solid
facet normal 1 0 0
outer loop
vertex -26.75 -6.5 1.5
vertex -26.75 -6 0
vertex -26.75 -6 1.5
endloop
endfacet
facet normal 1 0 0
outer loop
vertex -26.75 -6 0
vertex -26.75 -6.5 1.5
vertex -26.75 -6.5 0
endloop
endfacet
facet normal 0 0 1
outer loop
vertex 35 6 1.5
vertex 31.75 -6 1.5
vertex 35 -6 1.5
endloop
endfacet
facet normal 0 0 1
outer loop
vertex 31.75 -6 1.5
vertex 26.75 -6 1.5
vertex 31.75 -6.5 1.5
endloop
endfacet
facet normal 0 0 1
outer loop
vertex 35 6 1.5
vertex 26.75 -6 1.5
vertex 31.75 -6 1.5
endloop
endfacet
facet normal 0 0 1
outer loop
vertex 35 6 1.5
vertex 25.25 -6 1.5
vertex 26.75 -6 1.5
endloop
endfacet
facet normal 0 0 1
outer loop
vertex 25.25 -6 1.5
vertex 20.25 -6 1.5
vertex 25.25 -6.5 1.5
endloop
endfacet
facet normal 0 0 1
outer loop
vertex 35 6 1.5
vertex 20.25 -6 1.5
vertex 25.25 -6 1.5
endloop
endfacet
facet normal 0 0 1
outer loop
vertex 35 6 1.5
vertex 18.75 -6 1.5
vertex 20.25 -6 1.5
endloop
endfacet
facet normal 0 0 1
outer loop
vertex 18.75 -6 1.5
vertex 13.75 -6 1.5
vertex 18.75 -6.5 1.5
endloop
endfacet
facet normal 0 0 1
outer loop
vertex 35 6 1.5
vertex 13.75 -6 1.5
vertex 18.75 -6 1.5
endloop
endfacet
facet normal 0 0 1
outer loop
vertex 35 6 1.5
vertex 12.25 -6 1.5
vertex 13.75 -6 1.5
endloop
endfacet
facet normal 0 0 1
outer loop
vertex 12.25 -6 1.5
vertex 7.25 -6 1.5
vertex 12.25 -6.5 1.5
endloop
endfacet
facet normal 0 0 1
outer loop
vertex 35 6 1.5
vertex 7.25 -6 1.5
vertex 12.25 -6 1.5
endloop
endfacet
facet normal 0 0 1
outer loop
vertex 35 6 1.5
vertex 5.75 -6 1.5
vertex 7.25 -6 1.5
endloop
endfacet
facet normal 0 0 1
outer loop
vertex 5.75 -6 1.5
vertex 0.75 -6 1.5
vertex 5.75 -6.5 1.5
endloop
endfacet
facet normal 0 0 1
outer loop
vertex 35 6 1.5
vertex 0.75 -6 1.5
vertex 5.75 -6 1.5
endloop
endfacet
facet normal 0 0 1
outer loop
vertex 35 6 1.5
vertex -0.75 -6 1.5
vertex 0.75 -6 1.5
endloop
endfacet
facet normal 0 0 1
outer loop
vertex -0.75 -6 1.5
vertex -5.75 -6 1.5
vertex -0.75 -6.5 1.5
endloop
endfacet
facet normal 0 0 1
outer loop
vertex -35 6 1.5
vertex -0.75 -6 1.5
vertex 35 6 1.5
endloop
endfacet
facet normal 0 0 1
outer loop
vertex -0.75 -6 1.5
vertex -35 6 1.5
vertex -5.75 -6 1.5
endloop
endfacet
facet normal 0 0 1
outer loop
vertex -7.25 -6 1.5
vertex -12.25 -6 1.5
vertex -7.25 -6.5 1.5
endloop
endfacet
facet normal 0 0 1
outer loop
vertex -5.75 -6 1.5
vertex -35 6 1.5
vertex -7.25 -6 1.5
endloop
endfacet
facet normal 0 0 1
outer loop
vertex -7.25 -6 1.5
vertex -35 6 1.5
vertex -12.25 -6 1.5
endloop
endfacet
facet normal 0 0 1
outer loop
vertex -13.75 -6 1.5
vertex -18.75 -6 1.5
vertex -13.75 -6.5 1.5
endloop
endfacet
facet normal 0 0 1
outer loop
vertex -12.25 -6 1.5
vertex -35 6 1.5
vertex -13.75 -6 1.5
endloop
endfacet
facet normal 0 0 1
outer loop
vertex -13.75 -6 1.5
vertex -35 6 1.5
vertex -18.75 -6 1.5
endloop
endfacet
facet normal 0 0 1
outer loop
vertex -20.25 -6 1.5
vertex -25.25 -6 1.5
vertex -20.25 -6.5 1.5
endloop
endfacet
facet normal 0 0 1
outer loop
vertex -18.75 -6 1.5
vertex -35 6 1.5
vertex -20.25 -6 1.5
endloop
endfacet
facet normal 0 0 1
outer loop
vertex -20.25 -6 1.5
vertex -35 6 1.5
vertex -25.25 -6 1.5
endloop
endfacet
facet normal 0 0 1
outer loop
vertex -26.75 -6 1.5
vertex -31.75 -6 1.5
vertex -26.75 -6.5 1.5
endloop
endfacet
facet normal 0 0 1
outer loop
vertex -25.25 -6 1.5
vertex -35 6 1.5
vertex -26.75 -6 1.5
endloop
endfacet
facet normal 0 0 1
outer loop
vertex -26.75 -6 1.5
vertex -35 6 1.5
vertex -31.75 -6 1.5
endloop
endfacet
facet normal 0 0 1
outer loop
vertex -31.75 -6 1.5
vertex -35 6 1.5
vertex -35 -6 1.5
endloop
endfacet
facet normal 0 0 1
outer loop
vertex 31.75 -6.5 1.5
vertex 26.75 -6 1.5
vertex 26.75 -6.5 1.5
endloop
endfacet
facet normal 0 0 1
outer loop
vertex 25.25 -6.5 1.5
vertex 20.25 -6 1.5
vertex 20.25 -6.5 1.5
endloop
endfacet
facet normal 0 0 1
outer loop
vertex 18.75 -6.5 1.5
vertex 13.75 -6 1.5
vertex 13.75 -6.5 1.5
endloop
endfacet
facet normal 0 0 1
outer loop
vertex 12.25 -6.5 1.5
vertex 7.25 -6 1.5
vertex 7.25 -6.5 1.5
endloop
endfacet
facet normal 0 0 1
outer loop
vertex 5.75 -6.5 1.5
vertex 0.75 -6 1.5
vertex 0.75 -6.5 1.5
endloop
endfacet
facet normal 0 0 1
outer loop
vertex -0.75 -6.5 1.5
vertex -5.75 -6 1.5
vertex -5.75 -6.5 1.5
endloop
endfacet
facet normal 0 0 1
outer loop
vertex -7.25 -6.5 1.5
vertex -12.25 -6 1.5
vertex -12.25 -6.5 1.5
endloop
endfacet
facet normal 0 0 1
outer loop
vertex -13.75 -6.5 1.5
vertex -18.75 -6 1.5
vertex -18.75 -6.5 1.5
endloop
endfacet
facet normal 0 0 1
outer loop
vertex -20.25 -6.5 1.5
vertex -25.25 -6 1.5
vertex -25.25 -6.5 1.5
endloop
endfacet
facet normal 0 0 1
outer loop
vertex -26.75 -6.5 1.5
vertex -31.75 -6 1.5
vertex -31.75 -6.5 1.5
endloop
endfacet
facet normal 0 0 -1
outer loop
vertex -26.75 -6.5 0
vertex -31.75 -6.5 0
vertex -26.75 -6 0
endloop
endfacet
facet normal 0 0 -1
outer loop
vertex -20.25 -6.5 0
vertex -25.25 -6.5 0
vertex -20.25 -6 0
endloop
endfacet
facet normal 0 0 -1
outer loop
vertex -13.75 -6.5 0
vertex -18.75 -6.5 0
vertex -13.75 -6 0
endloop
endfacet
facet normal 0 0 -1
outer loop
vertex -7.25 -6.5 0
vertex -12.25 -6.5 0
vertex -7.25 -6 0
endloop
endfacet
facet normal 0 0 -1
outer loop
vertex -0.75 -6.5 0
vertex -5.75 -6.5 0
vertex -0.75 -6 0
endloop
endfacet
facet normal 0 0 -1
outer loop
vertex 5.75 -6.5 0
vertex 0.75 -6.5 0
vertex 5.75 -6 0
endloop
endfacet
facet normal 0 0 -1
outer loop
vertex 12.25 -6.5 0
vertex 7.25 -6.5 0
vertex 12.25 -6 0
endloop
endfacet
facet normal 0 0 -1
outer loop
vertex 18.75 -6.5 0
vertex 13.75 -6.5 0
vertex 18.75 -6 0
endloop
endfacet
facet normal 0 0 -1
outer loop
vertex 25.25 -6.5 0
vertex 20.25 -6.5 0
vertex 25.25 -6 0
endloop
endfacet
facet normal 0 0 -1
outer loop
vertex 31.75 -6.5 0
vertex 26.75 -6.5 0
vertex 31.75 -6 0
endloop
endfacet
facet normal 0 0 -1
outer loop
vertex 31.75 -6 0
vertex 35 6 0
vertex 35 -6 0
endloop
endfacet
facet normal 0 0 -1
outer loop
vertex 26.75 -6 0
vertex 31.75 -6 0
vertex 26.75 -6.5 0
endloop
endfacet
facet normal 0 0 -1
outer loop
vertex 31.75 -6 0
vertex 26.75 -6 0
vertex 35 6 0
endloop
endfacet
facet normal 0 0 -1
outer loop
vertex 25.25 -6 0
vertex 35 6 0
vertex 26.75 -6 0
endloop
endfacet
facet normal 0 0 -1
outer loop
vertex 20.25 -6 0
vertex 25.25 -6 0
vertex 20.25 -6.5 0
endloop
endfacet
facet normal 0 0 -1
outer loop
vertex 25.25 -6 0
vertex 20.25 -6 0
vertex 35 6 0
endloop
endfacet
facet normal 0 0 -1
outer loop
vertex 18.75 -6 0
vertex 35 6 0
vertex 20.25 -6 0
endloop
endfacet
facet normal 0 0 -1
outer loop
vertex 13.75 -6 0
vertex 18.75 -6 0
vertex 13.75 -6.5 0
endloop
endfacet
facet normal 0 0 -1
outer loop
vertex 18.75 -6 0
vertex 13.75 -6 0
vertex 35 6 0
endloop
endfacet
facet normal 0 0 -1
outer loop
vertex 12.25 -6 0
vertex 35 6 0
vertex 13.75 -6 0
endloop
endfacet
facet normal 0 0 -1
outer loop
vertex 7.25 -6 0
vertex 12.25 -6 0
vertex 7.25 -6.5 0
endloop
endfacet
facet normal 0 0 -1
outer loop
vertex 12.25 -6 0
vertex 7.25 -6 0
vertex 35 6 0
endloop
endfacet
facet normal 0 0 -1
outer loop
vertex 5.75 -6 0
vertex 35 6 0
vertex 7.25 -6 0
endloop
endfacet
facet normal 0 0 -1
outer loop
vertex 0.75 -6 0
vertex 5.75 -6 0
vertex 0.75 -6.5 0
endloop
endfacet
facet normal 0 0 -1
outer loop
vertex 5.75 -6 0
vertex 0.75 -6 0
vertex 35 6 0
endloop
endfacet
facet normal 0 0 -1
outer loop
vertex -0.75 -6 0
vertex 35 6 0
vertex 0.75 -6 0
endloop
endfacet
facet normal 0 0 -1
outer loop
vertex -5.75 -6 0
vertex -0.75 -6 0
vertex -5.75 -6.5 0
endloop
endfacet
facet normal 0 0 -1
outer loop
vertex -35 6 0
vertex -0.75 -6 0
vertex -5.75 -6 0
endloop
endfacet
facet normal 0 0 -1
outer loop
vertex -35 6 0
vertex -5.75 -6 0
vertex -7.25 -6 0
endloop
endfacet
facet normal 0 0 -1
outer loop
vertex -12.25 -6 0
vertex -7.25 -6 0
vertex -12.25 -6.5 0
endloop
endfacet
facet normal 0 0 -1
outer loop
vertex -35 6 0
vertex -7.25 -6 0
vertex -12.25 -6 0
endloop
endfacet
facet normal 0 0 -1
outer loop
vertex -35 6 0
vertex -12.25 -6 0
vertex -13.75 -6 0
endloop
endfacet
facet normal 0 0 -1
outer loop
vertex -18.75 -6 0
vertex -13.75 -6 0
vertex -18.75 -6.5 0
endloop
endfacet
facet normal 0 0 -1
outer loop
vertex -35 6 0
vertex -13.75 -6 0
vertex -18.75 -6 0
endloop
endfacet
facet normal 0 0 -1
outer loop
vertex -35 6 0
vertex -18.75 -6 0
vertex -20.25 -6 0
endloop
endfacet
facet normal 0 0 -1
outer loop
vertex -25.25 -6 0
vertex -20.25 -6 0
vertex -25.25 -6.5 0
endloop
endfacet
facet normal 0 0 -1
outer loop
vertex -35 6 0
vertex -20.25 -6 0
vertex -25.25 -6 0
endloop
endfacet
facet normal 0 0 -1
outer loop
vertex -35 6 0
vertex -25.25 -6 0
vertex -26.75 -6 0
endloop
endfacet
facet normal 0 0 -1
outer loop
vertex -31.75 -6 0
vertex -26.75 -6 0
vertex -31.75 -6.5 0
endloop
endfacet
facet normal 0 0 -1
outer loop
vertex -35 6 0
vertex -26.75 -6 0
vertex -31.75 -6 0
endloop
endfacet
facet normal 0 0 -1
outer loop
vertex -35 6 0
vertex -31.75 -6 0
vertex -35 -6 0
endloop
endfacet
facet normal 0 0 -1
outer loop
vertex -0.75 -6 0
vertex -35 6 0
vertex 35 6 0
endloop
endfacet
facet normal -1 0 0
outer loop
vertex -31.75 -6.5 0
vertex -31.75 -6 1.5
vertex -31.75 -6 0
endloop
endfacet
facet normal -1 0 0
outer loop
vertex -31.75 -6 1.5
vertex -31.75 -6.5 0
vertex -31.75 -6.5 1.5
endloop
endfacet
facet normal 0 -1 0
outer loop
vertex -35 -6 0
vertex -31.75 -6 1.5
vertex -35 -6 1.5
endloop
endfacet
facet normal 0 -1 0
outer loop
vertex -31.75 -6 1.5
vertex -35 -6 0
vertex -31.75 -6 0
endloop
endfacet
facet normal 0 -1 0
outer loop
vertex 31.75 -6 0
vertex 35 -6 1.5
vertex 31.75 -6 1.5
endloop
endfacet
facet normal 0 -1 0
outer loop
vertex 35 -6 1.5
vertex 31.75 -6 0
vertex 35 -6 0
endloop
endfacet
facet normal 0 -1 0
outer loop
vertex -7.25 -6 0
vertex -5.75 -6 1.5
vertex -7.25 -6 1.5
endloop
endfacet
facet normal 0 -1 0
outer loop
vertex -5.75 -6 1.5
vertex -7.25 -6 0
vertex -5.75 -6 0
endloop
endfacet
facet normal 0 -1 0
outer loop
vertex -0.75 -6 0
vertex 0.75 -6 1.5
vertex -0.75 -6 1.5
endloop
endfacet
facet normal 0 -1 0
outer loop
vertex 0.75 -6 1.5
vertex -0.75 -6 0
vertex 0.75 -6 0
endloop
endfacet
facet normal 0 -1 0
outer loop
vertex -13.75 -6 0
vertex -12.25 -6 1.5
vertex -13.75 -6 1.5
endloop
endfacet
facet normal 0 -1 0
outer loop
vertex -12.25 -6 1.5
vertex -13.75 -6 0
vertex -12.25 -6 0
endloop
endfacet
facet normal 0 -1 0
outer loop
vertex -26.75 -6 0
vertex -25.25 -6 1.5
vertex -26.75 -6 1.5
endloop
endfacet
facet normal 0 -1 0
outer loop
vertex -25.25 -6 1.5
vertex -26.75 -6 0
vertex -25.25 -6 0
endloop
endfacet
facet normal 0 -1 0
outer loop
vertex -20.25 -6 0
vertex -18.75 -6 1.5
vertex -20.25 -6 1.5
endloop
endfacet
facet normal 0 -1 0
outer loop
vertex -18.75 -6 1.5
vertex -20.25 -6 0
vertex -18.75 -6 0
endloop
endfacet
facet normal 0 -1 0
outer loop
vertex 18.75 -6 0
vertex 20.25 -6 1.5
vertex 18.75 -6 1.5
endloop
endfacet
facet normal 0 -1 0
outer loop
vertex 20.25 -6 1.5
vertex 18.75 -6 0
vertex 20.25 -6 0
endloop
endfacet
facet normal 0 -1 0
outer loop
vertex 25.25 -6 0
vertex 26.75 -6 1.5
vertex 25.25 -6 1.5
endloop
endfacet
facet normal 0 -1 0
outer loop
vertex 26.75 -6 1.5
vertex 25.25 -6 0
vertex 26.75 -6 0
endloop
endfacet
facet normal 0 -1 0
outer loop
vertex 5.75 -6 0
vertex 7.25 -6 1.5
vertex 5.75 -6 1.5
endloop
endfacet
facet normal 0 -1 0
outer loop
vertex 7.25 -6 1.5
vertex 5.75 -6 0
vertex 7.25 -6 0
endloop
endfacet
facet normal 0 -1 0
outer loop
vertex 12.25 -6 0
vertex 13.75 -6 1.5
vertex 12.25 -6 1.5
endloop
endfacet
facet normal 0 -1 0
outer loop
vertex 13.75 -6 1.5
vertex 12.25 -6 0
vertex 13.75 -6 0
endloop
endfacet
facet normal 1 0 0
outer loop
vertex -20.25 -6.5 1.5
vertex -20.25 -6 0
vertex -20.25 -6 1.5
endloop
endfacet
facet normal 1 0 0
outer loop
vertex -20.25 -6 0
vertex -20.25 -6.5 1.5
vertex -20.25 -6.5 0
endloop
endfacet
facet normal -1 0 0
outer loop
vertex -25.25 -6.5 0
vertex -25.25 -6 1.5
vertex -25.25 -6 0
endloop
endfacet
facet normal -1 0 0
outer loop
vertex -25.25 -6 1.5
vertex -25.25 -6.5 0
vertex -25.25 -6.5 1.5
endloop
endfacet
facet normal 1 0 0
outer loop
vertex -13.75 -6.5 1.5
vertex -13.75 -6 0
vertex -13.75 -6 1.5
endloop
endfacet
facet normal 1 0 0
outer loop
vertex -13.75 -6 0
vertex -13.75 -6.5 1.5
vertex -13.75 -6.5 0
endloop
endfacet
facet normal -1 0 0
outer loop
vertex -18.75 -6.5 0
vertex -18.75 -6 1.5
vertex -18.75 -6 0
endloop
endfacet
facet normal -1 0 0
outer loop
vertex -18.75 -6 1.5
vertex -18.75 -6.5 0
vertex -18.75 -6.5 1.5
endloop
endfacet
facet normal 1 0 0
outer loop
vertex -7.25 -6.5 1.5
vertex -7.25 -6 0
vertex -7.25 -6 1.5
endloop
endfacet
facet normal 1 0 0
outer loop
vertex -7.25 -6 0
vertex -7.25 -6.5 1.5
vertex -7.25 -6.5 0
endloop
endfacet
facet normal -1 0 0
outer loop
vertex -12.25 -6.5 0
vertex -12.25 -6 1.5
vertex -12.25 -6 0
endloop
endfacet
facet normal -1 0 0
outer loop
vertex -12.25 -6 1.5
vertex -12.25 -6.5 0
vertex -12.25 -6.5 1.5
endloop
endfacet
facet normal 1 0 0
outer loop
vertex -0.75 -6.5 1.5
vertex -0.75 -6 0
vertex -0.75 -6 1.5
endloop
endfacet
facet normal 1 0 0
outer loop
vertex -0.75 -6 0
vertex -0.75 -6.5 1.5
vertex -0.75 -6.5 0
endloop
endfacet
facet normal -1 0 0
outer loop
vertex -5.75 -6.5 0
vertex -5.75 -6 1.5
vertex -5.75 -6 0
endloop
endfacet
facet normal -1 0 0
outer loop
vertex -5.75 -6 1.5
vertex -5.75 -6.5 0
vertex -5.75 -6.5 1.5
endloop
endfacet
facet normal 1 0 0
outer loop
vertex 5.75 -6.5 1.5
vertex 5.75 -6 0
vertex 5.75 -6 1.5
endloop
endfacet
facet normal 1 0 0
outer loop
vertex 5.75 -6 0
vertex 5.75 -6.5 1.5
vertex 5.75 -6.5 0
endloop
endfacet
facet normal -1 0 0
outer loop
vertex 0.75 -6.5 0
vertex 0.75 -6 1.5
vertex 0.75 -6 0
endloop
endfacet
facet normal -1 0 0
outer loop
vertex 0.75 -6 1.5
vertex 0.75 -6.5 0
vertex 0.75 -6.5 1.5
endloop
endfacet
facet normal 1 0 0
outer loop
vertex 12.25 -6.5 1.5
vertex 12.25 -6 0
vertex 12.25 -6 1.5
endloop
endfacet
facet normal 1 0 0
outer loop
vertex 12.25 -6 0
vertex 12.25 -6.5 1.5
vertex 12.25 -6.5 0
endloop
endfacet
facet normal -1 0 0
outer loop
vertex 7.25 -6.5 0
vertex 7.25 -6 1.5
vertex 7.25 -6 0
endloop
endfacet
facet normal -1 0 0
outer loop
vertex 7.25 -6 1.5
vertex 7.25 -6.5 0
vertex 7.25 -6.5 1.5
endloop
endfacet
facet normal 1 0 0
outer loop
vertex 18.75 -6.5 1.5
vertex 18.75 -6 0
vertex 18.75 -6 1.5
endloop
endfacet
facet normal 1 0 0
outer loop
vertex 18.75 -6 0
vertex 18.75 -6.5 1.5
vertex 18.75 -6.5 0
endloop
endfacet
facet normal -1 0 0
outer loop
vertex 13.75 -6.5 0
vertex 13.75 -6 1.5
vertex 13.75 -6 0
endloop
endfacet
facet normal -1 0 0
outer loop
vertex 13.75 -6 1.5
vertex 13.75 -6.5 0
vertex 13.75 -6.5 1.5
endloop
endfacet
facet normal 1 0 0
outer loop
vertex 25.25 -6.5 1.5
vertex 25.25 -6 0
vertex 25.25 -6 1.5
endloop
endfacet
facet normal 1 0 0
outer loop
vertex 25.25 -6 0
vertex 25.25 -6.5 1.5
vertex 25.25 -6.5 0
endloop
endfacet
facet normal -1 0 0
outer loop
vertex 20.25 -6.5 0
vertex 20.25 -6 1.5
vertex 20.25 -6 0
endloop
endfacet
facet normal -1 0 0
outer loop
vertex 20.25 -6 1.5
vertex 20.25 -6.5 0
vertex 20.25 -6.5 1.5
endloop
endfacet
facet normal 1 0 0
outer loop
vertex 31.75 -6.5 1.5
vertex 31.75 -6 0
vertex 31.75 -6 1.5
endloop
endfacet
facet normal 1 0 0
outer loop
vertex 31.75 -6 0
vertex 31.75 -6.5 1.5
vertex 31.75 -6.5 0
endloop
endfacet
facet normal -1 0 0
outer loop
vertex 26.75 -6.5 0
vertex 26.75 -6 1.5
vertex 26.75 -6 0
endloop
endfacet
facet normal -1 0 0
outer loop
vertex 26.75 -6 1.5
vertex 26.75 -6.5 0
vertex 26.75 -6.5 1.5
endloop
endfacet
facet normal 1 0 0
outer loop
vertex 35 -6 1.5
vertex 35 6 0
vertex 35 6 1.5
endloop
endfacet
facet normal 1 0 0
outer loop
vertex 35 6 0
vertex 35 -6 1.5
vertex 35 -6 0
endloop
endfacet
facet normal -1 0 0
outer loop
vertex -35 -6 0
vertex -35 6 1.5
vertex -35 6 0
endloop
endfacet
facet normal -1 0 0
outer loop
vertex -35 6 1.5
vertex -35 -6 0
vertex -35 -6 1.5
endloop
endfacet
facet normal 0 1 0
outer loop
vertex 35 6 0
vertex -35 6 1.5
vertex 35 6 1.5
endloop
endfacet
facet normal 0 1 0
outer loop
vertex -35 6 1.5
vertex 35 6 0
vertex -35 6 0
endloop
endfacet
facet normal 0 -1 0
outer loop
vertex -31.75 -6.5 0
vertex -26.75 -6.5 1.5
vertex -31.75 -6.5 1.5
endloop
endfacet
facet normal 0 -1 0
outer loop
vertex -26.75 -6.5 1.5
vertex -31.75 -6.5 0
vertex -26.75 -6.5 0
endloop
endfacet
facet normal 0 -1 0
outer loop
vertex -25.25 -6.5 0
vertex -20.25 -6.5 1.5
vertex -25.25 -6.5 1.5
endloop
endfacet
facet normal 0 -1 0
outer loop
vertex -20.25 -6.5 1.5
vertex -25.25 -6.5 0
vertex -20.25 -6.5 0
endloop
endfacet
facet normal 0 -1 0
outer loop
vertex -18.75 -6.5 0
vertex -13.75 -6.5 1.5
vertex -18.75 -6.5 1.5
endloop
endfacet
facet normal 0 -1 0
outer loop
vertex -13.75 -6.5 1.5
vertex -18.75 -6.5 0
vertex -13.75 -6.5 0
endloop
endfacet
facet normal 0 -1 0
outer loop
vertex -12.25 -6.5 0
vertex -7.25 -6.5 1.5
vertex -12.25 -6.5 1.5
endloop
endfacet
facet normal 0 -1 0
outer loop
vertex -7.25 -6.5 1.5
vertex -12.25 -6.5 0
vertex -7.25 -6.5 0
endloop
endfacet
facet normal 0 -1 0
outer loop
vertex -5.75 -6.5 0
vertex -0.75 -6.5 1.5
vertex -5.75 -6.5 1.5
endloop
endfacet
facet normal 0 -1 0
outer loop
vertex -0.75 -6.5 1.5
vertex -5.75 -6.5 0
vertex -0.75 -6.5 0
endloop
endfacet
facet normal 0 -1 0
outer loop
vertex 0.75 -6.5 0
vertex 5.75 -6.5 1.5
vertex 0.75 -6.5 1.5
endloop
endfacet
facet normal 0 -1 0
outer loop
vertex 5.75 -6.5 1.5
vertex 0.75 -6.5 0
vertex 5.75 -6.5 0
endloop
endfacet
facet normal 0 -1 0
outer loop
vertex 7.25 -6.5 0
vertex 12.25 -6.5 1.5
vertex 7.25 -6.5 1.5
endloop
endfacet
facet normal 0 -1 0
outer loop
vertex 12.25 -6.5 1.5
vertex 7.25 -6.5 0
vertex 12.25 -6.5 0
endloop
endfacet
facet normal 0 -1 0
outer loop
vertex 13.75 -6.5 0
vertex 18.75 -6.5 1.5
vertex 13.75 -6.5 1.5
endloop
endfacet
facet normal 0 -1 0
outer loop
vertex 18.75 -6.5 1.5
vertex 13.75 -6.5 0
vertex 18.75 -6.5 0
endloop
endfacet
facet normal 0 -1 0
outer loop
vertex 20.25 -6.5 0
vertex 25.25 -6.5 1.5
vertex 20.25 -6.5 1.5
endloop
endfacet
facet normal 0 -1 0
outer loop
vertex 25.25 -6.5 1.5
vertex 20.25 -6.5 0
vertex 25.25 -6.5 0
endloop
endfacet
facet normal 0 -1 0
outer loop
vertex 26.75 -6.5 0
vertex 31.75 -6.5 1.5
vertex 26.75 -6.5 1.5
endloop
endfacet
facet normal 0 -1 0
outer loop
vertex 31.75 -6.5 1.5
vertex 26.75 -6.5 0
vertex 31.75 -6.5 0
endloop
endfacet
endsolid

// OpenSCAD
// 10-well comb for agarose gel casting, printed lying flat
// Units: mm

plate_t      = 1.5;   // plate thickness (Z)
spine_len    = 70;    // spine length (X)
spine_w      = 12;    // spine width (Y)
tooth_count  = 10;    // number of teeth
tooth_w      = 5.0;   // tooth width (X)
tooth_len    = 12;    // tooth length (Y)
gap          = 1.5;   // gap between teeth (X)
eps          = 0.5;   // cutter overshoot

$fn = 64;

pitch = tooth_w + gap;
x0   = -(tooth_count - 1) * pitch / 2;   // first tooth centre

difference() {
    union() {
        // spine
        translate([-spine_len / 2, -spine_w / 2, 0])
            cube([spine_len, spine_w, plate_t]);
        // teeth
        for (i = [0 : tooth_count - 1])
            translate([x0 + i * pitch - tooth_w / 2, -spine_w / 2 - tooth_len, 0])
                cube([tooth_w, tooth_len, plate_t]);
    }
    // wells (through-cut)
    for (i = [0 : tooth_count - 1])
        translate([x0 + i * pitch - tooth_w / 2, -spine_w / 2 - tooth_len - eps, -eps])
            cube([tooth_w, tooth_len, plate_t + 2 * eps]);
}
